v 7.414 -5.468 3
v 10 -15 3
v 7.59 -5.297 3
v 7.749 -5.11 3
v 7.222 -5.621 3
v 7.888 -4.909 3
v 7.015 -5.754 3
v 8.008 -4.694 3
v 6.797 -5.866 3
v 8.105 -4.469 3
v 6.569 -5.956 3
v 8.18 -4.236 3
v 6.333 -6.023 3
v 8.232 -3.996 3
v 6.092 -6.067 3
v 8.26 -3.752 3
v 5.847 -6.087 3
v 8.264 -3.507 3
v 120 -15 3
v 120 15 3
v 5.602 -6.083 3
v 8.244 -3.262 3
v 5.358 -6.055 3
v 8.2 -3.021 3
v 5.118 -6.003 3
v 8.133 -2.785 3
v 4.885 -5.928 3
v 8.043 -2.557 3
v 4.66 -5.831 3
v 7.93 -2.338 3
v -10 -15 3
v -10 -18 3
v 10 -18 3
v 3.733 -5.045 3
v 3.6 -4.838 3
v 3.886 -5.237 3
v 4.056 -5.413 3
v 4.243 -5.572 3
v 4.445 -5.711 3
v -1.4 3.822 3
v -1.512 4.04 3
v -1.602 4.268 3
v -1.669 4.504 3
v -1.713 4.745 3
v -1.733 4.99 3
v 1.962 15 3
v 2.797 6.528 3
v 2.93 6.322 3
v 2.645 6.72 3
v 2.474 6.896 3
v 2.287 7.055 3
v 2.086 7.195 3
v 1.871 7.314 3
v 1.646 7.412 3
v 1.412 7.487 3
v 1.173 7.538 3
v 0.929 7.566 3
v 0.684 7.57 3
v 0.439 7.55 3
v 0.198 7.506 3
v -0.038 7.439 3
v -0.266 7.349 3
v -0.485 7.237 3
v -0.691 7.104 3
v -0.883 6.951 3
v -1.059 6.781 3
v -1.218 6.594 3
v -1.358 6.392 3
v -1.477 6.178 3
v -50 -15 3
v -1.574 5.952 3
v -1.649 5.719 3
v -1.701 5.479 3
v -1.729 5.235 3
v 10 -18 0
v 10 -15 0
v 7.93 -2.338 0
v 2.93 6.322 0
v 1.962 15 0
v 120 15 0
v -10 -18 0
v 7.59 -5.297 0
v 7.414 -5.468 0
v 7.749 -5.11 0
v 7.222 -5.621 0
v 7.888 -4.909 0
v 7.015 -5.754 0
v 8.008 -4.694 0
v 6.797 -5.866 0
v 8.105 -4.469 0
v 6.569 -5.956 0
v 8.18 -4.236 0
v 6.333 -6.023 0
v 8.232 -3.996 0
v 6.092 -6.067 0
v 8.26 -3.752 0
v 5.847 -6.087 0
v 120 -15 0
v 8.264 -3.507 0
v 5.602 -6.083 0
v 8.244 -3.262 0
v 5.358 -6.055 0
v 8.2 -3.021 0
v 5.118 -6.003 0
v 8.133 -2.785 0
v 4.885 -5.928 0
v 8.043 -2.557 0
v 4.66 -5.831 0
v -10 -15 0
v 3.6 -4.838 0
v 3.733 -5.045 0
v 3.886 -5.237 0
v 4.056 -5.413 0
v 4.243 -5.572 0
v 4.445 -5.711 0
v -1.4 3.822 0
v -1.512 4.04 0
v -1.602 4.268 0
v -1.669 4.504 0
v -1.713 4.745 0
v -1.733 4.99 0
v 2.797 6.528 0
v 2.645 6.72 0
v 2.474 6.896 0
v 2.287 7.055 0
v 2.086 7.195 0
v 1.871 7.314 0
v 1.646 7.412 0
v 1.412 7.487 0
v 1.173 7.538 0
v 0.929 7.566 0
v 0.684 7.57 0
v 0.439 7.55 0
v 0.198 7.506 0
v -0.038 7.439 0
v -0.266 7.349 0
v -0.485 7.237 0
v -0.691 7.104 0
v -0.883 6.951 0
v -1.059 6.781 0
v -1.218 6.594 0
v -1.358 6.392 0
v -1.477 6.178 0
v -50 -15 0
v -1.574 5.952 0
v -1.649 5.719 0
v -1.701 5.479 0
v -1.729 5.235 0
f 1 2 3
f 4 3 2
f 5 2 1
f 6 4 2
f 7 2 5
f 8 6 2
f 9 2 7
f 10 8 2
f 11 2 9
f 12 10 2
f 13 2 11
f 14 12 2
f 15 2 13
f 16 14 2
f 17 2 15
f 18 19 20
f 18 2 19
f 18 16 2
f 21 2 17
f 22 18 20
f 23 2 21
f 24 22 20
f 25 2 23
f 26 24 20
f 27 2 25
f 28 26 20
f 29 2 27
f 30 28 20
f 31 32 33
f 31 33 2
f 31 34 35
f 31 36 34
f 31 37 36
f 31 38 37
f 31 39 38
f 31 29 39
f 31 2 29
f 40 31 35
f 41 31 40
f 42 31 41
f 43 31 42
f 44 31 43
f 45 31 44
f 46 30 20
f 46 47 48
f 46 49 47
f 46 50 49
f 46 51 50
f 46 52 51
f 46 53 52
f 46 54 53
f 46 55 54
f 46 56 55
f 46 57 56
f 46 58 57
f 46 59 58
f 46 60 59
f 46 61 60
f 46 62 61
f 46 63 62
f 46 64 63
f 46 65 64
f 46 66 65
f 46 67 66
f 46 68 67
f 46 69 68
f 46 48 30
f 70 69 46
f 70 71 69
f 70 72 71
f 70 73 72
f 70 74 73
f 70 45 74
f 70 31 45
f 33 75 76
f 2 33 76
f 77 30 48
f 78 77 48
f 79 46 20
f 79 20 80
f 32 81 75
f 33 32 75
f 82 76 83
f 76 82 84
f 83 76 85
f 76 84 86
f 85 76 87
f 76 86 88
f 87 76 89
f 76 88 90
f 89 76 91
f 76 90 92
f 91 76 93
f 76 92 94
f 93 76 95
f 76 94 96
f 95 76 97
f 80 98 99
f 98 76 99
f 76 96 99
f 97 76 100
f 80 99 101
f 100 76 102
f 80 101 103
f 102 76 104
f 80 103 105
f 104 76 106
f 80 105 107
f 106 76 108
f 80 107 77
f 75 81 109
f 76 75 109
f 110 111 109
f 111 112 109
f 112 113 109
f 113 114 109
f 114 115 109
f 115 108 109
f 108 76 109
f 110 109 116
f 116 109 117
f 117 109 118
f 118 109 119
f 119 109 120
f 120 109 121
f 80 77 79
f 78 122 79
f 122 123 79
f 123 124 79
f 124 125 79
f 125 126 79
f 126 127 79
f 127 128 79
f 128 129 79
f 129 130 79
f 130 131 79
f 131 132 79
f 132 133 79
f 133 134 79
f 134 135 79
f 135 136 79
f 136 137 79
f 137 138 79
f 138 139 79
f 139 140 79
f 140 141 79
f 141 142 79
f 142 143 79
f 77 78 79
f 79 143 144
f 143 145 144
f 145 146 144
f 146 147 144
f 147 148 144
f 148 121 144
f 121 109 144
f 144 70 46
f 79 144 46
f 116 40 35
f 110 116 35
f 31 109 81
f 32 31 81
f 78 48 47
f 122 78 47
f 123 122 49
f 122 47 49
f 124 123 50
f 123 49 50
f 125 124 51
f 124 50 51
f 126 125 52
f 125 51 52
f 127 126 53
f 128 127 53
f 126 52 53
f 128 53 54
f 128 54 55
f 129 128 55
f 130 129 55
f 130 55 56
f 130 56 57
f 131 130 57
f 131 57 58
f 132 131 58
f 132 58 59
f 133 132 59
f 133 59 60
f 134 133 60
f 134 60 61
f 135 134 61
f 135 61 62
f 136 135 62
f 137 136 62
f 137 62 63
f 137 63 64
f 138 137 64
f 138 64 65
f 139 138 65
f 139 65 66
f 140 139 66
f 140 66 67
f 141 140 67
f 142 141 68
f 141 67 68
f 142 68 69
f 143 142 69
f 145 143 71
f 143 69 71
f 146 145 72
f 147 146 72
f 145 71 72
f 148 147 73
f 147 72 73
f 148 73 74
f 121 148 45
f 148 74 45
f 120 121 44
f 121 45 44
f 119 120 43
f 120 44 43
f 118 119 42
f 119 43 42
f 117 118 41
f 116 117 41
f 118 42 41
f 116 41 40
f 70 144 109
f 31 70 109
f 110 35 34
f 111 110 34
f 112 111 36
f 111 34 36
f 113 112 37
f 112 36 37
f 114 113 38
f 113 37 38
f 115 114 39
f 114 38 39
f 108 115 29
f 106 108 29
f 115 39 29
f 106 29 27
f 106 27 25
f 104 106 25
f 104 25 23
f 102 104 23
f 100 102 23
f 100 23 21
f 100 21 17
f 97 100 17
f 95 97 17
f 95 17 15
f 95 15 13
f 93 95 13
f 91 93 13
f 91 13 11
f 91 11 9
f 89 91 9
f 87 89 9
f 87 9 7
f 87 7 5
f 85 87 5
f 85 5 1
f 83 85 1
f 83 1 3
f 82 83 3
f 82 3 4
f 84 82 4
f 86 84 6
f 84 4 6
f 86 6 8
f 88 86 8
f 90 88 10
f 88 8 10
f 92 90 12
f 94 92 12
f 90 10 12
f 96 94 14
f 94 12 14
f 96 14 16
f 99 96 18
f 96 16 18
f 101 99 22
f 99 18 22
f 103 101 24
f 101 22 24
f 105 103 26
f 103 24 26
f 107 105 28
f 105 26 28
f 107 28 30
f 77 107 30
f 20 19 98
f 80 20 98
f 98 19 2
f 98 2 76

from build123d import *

# Parameters (mm, degrees)
BOSS_EXTRUDE1_DEPTH     = 3
CUT_EXTRUDE3_DEPTH      = 1
CUT_EXTRUDE3_DEPTH_BACK = 3
CUT_EXTRUDE4_DEPTH      = 4
SKETCH6_W               = 3
SKETCH6_H               = 30
BOSS_EXTRUDE2_DEPTH     = 70


with BuildPart() as part:
    # Sketch1 → Boss-Extrude1 (new body)
    with BuildSketch(Plane.XY):
        Polygon((-10, -15), (-10, -18), (10, -18), (10, -15), (50, -15), (50, 15), (-50, 15), (-50, -15), align=None)
    extrude(amount=BOSS_EXTRUDE1_DEPTH)

    # Sketch4 → Cut-Extrude3 (cut, two sides)
    with BuildSketch(Plane.XY.offset(3)) as cut_extrude3_sk:
        Polygon((-50, -14.220304878), (-50, -15), (1.961524227, 15), (-50, 15), align=None)
    extrude(amount=CUT_EXTRUDE3_DEPTH, mode=Mode.SUBTRACT)
    extrude(cut_extrude3_sk.sketch, amount=-CUT_EXTRUDE3_DEPTH_BACK, mode=Mode.SUBTRACT)

    # Sketch5 → Cut-Extrude4 (cut)
    with BuildSketch(Plane.XY.offset(3)):
        with BuildLine():
            Line((7.930435314, -2.338457268), (2.930435314, 6.32179677))
            ThreePointArc((2.930435314, 6.32179677), (-0.484628196, 7.236860279), (-1.399691705, 3.82179677))
            Line((-1.399691705, 3.82179677), (3.600308295, -4.838457268))
            ThreePointArc((3.600308295, -4.838457268), (7.015371804, -5.753520778), (7.930435314, -2.338457268))
        make_face()
    extrude(amount=-CUT_EXTRUDE4_DEPTH, mode=Mode.SUBTRACT)

    # Sketch6 → Boss-Extrude2 (add)
    with BuildSketch(Plane(origin=(50, 0, 0), x_dir=(0, 0, -1), z_dir=(1, 0, 0))):
        with Locations((-1.5, 0)):
            Rectangle(SKETCH6_W, SKETCH6_H)
    extrude(amount=BOSS_EXTRUDE2_DEPTH)


solid = part.part
